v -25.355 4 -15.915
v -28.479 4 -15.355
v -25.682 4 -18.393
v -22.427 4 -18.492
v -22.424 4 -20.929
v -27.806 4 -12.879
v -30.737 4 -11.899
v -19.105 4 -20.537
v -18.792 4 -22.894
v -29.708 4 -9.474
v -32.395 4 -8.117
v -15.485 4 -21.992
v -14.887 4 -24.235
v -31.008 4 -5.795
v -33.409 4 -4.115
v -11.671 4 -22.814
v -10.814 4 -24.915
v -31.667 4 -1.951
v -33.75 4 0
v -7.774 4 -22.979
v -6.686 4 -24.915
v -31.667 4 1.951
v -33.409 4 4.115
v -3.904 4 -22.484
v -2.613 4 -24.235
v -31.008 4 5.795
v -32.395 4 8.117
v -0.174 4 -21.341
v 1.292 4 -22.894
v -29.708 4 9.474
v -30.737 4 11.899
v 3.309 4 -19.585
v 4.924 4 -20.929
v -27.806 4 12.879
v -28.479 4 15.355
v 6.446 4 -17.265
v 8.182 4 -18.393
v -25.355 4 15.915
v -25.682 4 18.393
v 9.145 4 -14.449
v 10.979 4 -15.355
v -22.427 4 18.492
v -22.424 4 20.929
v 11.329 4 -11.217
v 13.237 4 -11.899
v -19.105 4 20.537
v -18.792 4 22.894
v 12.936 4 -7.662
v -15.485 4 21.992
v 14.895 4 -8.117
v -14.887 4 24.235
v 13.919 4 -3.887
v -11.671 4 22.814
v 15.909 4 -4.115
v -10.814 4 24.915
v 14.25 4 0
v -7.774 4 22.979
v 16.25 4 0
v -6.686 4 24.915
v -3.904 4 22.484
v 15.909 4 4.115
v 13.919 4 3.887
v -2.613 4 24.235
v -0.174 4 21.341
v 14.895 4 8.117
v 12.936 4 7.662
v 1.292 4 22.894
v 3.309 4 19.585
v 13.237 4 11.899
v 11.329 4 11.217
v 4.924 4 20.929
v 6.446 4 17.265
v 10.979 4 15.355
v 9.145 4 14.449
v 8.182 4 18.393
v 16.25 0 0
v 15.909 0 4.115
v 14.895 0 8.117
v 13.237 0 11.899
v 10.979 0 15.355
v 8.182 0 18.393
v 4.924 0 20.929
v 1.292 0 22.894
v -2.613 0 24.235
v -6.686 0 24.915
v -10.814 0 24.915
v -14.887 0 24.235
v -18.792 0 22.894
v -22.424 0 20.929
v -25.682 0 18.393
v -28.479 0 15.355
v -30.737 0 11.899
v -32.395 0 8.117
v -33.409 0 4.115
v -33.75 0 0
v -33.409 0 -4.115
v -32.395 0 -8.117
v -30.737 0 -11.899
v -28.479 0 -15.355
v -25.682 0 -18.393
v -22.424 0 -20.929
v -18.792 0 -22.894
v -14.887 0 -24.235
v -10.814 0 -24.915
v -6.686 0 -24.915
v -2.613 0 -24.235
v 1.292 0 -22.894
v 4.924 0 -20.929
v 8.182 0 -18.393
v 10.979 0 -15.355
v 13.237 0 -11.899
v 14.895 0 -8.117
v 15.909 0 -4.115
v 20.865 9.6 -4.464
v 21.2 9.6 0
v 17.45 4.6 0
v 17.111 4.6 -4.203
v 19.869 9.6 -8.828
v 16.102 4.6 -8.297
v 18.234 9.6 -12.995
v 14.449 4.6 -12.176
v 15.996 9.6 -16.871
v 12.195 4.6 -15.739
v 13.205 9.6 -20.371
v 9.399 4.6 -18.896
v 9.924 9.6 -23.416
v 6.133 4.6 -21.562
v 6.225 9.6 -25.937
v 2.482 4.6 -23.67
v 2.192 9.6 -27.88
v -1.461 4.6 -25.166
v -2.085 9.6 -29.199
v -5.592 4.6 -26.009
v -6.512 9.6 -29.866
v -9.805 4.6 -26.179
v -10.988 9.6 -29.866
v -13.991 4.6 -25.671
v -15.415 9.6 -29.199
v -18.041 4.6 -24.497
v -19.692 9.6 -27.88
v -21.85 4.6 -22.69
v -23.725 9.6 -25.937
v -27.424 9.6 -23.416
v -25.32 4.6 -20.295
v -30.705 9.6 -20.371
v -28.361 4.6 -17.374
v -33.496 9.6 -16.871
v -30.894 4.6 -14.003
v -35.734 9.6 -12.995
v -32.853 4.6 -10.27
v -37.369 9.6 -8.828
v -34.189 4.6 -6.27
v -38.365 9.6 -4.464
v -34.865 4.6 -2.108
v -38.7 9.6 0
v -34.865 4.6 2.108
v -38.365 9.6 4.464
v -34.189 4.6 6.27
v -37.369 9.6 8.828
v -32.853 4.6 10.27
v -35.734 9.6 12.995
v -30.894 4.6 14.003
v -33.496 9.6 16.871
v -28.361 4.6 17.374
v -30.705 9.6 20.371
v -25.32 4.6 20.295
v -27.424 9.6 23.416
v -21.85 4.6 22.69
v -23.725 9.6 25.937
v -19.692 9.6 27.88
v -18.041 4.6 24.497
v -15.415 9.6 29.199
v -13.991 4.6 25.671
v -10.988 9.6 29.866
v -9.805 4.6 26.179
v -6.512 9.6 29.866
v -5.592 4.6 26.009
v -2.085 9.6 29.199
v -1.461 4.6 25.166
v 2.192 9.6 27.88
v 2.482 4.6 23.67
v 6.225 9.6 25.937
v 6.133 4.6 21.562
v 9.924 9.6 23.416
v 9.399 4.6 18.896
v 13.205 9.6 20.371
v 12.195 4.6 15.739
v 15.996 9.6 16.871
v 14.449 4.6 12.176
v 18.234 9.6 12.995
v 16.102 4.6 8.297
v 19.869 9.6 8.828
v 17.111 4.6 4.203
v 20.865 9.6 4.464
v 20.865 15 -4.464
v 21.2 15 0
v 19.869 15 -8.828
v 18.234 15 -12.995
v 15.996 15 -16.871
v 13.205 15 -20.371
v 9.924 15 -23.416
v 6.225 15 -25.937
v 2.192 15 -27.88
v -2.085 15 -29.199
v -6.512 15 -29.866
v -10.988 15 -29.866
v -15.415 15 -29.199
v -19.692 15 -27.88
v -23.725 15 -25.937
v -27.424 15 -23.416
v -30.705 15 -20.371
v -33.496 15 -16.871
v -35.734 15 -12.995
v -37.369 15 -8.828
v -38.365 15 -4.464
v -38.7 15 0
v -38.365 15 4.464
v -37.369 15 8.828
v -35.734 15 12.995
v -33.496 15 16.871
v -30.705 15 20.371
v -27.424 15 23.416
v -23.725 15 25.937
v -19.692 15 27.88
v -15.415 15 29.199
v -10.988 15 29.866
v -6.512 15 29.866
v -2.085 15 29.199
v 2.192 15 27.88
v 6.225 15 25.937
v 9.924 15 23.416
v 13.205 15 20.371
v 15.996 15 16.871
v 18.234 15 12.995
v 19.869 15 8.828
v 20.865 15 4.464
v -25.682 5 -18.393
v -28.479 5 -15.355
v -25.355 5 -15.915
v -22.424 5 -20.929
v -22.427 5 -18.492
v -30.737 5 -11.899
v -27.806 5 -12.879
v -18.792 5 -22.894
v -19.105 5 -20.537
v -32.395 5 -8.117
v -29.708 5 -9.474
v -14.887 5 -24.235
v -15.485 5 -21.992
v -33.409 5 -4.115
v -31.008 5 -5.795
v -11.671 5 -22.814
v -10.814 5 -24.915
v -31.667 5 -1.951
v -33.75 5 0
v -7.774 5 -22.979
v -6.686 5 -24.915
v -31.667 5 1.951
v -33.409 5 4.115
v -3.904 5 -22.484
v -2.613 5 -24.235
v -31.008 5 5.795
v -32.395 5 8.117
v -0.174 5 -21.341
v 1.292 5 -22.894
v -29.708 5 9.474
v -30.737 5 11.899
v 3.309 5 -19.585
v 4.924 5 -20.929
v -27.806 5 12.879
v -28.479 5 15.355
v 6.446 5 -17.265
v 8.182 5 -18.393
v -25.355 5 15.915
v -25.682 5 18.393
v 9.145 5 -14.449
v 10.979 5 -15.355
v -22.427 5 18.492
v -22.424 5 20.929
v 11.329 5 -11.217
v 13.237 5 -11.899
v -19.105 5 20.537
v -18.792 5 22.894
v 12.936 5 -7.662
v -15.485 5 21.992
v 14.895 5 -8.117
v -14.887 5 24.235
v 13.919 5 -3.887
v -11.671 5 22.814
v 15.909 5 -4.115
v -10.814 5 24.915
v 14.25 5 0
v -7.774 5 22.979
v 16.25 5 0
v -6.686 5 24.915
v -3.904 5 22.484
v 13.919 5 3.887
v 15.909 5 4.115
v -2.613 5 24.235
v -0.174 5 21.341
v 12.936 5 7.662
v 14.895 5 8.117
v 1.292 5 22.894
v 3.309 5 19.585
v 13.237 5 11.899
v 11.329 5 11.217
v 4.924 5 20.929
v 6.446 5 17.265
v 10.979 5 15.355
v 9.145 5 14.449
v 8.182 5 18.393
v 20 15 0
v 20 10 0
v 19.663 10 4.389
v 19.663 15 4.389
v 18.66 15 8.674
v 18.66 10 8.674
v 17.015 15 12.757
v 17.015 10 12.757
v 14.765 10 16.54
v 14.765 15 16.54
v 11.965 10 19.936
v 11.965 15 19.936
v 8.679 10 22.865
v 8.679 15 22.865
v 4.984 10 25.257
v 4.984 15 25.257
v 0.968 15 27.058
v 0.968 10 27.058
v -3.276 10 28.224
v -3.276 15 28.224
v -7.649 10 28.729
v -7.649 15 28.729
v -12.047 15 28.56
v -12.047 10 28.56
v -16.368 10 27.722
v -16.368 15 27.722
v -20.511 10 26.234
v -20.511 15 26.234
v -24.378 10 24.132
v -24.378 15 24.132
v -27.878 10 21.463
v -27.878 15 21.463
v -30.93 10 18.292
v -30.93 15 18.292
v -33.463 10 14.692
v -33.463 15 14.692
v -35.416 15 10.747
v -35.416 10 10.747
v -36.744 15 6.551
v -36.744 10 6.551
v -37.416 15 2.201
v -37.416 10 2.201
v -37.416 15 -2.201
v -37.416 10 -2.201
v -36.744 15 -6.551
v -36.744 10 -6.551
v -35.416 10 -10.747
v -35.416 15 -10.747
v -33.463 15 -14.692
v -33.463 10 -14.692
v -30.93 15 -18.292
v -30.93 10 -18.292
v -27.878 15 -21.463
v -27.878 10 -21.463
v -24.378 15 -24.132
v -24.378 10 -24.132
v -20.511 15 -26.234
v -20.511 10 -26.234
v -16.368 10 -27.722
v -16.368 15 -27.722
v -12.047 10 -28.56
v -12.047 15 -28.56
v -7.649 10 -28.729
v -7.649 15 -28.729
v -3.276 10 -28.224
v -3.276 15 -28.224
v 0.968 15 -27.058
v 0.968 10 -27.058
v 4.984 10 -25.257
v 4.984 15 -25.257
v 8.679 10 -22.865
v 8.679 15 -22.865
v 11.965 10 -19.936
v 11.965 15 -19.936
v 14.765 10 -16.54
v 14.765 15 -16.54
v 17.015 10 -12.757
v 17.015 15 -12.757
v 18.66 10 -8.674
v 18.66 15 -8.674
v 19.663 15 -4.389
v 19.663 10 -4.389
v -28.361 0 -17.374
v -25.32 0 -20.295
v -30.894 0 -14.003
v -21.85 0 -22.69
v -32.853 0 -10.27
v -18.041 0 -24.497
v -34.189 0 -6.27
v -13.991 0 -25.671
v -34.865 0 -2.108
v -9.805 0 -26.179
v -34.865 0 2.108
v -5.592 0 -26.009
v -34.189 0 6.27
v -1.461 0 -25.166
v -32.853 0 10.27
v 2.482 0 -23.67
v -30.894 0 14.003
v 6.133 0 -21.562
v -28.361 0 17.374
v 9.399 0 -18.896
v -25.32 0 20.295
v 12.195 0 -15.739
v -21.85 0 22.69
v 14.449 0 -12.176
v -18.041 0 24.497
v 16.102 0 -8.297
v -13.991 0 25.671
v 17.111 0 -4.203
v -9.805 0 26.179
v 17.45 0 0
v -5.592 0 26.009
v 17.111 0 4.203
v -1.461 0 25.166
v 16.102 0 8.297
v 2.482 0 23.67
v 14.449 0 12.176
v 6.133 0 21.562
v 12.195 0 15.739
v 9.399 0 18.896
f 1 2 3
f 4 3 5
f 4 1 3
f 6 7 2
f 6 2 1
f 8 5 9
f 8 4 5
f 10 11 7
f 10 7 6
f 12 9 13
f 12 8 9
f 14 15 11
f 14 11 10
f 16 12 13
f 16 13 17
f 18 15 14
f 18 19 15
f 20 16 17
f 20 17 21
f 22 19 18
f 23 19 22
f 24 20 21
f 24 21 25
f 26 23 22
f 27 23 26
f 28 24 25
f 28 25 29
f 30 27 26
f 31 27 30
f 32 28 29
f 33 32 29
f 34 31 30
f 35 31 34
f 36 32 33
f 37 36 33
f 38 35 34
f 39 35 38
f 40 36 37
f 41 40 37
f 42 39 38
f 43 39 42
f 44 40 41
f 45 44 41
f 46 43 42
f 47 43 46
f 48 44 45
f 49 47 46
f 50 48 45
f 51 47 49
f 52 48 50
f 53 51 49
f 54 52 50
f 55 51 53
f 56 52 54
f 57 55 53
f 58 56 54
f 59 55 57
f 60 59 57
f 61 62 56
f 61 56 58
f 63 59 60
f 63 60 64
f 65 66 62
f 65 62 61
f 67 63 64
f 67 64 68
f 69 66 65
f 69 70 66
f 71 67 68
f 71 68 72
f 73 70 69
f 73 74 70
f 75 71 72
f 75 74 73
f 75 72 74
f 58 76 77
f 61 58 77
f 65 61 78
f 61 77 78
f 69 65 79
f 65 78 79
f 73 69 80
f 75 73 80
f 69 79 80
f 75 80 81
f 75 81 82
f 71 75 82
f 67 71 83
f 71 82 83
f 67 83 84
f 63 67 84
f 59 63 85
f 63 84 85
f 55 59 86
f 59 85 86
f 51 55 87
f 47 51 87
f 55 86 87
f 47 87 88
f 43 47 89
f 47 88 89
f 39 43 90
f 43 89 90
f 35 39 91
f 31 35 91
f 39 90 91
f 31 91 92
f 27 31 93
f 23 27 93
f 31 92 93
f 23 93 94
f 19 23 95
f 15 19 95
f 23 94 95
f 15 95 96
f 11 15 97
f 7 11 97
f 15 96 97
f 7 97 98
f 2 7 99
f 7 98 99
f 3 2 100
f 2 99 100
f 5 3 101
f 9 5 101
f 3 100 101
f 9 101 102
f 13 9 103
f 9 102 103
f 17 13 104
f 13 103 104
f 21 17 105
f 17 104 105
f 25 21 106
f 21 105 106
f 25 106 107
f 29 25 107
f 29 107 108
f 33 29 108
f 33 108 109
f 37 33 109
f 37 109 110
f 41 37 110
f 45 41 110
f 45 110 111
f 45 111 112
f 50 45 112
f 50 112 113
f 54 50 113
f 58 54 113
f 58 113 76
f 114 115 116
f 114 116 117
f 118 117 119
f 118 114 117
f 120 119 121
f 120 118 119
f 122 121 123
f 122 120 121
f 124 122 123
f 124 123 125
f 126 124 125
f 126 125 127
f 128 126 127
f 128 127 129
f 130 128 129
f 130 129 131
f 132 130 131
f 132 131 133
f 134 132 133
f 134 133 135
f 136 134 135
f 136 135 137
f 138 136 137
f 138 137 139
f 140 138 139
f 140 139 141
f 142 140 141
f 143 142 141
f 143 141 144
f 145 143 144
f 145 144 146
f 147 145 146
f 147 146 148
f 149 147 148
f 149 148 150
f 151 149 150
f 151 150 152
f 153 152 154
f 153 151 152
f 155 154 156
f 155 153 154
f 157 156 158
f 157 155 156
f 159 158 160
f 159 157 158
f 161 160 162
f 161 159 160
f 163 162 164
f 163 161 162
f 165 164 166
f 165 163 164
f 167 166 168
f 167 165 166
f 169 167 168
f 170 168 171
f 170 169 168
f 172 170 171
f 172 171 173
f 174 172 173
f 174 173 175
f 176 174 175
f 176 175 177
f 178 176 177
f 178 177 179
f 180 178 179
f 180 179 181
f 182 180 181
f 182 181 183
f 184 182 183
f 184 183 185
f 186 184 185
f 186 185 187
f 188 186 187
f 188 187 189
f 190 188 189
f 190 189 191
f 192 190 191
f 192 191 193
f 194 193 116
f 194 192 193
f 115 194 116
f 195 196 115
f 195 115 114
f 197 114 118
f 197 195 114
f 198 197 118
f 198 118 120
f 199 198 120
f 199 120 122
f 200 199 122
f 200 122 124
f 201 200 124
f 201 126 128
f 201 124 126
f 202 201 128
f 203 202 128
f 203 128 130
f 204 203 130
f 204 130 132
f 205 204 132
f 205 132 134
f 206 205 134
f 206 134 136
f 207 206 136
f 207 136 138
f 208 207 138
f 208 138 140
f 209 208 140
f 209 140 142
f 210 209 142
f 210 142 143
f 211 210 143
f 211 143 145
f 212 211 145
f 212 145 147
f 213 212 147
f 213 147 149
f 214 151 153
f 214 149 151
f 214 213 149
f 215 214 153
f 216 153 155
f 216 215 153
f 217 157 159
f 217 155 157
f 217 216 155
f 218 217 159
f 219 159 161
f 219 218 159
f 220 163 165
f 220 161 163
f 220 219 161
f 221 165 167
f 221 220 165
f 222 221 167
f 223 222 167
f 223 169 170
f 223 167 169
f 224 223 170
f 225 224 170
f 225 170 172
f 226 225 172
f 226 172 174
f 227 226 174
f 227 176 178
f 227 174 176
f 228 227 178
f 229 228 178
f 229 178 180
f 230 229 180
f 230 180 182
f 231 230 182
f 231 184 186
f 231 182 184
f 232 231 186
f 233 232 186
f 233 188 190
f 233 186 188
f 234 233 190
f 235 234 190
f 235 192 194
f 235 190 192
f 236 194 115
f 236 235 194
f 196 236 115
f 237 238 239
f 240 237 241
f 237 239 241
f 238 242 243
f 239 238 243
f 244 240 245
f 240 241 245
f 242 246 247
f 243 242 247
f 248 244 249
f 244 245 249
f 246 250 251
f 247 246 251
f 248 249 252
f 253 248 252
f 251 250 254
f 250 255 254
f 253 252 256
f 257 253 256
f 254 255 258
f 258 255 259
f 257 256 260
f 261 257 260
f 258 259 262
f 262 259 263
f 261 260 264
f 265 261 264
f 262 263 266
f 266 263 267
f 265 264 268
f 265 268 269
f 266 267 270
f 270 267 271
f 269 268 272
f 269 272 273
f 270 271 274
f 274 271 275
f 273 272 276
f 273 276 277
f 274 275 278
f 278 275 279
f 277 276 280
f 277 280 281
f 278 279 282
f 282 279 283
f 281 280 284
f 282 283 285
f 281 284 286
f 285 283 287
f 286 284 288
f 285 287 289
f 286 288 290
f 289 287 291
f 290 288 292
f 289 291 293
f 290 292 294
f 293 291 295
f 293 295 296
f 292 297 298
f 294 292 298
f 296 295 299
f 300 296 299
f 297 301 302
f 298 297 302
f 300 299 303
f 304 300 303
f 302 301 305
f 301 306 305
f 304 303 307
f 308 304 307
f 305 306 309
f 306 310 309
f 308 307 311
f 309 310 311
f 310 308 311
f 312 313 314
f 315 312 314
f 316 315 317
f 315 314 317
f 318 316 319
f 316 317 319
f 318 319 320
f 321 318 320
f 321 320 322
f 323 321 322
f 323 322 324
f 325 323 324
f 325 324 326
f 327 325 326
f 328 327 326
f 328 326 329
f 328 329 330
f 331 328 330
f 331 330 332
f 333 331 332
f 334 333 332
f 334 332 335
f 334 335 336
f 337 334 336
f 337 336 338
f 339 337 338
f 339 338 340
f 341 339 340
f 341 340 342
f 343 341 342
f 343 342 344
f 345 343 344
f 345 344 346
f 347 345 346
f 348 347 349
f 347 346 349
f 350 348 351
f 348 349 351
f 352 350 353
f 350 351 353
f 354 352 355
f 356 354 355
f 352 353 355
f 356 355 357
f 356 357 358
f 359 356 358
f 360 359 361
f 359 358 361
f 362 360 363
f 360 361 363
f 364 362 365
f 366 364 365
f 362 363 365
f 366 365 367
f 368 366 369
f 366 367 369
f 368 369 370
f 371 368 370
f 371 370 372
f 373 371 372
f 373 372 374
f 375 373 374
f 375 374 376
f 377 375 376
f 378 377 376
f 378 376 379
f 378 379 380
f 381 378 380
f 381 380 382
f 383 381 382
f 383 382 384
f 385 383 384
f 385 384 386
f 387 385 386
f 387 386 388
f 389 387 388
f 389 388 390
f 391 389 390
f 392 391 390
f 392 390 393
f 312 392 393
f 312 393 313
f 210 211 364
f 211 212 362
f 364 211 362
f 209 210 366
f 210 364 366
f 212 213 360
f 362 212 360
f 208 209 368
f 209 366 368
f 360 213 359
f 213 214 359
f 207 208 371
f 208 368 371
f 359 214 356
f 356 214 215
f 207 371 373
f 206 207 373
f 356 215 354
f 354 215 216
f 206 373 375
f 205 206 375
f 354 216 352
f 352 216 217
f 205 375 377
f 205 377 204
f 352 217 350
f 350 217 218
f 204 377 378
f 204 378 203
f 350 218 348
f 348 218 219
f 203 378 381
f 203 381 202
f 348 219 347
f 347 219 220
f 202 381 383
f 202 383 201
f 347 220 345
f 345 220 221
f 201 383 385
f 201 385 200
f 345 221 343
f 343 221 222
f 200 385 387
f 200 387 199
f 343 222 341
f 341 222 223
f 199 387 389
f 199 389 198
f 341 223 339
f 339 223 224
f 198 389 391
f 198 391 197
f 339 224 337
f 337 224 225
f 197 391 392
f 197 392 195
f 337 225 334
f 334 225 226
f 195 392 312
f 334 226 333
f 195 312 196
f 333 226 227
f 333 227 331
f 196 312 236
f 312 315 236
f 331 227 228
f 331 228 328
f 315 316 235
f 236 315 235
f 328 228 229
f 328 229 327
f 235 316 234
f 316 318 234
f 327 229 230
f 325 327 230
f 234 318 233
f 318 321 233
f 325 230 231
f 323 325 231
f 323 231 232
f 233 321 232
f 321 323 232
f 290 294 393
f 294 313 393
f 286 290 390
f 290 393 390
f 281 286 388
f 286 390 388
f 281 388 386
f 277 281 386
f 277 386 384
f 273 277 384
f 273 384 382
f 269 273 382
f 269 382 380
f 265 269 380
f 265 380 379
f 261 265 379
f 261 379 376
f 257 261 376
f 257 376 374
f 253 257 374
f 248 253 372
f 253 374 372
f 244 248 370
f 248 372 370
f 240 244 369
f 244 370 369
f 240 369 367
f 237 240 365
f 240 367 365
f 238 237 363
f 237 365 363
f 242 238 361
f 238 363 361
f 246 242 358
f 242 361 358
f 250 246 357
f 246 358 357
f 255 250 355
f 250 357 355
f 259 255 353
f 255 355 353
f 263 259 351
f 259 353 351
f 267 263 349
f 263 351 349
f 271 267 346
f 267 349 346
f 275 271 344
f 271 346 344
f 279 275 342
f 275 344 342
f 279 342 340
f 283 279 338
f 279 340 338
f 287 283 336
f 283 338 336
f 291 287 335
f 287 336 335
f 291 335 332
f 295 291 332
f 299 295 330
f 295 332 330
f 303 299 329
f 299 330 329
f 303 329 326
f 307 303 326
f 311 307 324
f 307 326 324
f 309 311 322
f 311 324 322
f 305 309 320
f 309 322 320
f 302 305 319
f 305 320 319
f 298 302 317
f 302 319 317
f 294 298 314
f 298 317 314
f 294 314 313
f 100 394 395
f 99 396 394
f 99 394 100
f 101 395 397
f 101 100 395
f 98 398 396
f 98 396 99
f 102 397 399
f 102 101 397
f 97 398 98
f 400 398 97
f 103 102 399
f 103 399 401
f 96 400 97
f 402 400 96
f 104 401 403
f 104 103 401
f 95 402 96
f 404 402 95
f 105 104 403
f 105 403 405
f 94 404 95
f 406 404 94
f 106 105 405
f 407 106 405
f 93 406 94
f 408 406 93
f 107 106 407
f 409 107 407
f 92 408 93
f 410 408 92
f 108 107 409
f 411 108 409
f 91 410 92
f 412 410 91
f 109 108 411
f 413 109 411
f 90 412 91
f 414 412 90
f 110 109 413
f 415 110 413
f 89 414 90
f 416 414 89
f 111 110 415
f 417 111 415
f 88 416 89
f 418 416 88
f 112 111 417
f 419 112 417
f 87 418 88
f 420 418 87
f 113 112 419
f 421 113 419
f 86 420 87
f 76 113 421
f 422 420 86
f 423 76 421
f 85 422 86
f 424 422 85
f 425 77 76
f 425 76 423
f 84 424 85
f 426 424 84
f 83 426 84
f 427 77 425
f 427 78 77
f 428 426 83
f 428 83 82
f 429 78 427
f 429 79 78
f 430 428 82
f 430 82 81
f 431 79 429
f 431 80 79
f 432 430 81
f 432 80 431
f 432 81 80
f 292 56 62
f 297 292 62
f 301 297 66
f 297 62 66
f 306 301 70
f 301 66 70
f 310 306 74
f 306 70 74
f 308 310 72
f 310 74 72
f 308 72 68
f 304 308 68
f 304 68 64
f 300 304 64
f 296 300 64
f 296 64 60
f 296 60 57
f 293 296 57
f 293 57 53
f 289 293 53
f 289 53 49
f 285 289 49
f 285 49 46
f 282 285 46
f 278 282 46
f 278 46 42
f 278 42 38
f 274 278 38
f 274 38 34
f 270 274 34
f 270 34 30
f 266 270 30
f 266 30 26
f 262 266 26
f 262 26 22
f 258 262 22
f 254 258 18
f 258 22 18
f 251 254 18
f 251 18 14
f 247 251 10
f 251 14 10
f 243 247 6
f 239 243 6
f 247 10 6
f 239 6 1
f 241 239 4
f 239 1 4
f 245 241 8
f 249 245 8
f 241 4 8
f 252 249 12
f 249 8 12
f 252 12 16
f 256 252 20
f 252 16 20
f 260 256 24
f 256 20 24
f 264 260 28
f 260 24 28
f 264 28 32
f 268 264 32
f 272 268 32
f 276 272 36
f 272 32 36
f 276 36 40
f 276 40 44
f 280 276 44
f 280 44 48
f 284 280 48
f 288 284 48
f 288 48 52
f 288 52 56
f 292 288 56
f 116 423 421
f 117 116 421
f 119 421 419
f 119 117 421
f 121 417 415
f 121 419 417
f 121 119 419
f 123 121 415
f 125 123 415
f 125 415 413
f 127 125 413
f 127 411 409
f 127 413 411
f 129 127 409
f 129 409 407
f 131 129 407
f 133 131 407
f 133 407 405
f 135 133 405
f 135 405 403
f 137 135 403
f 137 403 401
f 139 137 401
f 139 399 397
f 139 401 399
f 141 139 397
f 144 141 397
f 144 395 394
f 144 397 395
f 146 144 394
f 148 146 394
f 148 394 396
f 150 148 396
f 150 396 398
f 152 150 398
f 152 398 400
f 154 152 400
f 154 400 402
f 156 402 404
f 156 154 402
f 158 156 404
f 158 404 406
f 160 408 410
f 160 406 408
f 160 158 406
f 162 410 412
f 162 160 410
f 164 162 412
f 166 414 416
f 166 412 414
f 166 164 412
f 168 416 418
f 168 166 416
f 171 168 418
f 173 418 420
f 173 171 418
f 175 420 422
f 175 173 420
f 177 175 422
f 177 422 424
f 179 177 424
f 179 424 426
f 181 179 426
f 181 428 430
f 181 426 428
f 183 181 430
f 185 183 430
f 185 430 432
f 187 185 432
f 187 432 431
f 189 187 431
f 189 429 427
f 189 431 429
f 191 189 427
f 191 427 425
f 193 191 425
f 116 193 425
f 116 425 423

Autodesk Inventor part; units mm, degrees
ref_plane "YZ Plane" through (0, 0, 0) normal (1, 0, 0) x (0, 1, 0)
ref_plane "XZ Plane" through (0, 0, 0) normal (0, 1, 0) x (-1, 0, 0)
ref_plane "XY Plane" through (0, 0, 0) normal (0, 0, 1) x (1, 0, 0)
sketch "Esquisse2" plane through (0, 0, 0) normal (0, 0, 1) x (1, 0, 0)
  line L0 (-8.75, 36.8757) -> (-8.75, -38.6317)
  line L1 (20, 15) -> (20, 10)
  line L2 (16.25, 4) -> (16.25, 0)
  line L3 (20, 10) -> (16.25, 5)
  line L4 (16.25, 0) -> (17.45, 0)
  line L5 (17.45, 0) -> (17.45, 4.6)
  line L6 (17.45, 4.6) -> (21.2, 9.6)
  line L7 (21.2, 9.6) -> (21.2, 15)
  line L8 (21.2, 15) -> (20, 15)
  line L9 (16.25, 5) -> (14.25, 5)
  line L10 (14.25, 5) -> (14.25, 4)
  line L11 (14.25, 4) -> (16.25, 4)
  line L12 (-14.74, 0) -> (27.19, 0) construction
  line L13 (0, 51.9772) -> (0, -53.7332) construction
  point P0 (0, 0)
  dimension "d0" = 57.5
  dimension "d1" = 50
  dimension "d3" = 5
  dimension "d4" = 5
  dimension "d5" = 5
  dimension "d6" = 1.2
  dimension "d7" = 1.2
  dimension "d8" = 1.2
  dimension "d10" = 1
  dimension "d11" = 2
  dimension "d12" = 143.13
  dimension "d13" = 5
  dimension "d14" = 4.6
  dimension "d15" = 5.4
  dimension "d16" = 0
  dimension "d17" = 20
revolve "Révolution1" add sketch "Esquisse2" angle 360 about axis through (-8.75, 36.8757, 0) along (0, -1, 0)
properties part number "P012_Canon_AdaptCoudeTube"
